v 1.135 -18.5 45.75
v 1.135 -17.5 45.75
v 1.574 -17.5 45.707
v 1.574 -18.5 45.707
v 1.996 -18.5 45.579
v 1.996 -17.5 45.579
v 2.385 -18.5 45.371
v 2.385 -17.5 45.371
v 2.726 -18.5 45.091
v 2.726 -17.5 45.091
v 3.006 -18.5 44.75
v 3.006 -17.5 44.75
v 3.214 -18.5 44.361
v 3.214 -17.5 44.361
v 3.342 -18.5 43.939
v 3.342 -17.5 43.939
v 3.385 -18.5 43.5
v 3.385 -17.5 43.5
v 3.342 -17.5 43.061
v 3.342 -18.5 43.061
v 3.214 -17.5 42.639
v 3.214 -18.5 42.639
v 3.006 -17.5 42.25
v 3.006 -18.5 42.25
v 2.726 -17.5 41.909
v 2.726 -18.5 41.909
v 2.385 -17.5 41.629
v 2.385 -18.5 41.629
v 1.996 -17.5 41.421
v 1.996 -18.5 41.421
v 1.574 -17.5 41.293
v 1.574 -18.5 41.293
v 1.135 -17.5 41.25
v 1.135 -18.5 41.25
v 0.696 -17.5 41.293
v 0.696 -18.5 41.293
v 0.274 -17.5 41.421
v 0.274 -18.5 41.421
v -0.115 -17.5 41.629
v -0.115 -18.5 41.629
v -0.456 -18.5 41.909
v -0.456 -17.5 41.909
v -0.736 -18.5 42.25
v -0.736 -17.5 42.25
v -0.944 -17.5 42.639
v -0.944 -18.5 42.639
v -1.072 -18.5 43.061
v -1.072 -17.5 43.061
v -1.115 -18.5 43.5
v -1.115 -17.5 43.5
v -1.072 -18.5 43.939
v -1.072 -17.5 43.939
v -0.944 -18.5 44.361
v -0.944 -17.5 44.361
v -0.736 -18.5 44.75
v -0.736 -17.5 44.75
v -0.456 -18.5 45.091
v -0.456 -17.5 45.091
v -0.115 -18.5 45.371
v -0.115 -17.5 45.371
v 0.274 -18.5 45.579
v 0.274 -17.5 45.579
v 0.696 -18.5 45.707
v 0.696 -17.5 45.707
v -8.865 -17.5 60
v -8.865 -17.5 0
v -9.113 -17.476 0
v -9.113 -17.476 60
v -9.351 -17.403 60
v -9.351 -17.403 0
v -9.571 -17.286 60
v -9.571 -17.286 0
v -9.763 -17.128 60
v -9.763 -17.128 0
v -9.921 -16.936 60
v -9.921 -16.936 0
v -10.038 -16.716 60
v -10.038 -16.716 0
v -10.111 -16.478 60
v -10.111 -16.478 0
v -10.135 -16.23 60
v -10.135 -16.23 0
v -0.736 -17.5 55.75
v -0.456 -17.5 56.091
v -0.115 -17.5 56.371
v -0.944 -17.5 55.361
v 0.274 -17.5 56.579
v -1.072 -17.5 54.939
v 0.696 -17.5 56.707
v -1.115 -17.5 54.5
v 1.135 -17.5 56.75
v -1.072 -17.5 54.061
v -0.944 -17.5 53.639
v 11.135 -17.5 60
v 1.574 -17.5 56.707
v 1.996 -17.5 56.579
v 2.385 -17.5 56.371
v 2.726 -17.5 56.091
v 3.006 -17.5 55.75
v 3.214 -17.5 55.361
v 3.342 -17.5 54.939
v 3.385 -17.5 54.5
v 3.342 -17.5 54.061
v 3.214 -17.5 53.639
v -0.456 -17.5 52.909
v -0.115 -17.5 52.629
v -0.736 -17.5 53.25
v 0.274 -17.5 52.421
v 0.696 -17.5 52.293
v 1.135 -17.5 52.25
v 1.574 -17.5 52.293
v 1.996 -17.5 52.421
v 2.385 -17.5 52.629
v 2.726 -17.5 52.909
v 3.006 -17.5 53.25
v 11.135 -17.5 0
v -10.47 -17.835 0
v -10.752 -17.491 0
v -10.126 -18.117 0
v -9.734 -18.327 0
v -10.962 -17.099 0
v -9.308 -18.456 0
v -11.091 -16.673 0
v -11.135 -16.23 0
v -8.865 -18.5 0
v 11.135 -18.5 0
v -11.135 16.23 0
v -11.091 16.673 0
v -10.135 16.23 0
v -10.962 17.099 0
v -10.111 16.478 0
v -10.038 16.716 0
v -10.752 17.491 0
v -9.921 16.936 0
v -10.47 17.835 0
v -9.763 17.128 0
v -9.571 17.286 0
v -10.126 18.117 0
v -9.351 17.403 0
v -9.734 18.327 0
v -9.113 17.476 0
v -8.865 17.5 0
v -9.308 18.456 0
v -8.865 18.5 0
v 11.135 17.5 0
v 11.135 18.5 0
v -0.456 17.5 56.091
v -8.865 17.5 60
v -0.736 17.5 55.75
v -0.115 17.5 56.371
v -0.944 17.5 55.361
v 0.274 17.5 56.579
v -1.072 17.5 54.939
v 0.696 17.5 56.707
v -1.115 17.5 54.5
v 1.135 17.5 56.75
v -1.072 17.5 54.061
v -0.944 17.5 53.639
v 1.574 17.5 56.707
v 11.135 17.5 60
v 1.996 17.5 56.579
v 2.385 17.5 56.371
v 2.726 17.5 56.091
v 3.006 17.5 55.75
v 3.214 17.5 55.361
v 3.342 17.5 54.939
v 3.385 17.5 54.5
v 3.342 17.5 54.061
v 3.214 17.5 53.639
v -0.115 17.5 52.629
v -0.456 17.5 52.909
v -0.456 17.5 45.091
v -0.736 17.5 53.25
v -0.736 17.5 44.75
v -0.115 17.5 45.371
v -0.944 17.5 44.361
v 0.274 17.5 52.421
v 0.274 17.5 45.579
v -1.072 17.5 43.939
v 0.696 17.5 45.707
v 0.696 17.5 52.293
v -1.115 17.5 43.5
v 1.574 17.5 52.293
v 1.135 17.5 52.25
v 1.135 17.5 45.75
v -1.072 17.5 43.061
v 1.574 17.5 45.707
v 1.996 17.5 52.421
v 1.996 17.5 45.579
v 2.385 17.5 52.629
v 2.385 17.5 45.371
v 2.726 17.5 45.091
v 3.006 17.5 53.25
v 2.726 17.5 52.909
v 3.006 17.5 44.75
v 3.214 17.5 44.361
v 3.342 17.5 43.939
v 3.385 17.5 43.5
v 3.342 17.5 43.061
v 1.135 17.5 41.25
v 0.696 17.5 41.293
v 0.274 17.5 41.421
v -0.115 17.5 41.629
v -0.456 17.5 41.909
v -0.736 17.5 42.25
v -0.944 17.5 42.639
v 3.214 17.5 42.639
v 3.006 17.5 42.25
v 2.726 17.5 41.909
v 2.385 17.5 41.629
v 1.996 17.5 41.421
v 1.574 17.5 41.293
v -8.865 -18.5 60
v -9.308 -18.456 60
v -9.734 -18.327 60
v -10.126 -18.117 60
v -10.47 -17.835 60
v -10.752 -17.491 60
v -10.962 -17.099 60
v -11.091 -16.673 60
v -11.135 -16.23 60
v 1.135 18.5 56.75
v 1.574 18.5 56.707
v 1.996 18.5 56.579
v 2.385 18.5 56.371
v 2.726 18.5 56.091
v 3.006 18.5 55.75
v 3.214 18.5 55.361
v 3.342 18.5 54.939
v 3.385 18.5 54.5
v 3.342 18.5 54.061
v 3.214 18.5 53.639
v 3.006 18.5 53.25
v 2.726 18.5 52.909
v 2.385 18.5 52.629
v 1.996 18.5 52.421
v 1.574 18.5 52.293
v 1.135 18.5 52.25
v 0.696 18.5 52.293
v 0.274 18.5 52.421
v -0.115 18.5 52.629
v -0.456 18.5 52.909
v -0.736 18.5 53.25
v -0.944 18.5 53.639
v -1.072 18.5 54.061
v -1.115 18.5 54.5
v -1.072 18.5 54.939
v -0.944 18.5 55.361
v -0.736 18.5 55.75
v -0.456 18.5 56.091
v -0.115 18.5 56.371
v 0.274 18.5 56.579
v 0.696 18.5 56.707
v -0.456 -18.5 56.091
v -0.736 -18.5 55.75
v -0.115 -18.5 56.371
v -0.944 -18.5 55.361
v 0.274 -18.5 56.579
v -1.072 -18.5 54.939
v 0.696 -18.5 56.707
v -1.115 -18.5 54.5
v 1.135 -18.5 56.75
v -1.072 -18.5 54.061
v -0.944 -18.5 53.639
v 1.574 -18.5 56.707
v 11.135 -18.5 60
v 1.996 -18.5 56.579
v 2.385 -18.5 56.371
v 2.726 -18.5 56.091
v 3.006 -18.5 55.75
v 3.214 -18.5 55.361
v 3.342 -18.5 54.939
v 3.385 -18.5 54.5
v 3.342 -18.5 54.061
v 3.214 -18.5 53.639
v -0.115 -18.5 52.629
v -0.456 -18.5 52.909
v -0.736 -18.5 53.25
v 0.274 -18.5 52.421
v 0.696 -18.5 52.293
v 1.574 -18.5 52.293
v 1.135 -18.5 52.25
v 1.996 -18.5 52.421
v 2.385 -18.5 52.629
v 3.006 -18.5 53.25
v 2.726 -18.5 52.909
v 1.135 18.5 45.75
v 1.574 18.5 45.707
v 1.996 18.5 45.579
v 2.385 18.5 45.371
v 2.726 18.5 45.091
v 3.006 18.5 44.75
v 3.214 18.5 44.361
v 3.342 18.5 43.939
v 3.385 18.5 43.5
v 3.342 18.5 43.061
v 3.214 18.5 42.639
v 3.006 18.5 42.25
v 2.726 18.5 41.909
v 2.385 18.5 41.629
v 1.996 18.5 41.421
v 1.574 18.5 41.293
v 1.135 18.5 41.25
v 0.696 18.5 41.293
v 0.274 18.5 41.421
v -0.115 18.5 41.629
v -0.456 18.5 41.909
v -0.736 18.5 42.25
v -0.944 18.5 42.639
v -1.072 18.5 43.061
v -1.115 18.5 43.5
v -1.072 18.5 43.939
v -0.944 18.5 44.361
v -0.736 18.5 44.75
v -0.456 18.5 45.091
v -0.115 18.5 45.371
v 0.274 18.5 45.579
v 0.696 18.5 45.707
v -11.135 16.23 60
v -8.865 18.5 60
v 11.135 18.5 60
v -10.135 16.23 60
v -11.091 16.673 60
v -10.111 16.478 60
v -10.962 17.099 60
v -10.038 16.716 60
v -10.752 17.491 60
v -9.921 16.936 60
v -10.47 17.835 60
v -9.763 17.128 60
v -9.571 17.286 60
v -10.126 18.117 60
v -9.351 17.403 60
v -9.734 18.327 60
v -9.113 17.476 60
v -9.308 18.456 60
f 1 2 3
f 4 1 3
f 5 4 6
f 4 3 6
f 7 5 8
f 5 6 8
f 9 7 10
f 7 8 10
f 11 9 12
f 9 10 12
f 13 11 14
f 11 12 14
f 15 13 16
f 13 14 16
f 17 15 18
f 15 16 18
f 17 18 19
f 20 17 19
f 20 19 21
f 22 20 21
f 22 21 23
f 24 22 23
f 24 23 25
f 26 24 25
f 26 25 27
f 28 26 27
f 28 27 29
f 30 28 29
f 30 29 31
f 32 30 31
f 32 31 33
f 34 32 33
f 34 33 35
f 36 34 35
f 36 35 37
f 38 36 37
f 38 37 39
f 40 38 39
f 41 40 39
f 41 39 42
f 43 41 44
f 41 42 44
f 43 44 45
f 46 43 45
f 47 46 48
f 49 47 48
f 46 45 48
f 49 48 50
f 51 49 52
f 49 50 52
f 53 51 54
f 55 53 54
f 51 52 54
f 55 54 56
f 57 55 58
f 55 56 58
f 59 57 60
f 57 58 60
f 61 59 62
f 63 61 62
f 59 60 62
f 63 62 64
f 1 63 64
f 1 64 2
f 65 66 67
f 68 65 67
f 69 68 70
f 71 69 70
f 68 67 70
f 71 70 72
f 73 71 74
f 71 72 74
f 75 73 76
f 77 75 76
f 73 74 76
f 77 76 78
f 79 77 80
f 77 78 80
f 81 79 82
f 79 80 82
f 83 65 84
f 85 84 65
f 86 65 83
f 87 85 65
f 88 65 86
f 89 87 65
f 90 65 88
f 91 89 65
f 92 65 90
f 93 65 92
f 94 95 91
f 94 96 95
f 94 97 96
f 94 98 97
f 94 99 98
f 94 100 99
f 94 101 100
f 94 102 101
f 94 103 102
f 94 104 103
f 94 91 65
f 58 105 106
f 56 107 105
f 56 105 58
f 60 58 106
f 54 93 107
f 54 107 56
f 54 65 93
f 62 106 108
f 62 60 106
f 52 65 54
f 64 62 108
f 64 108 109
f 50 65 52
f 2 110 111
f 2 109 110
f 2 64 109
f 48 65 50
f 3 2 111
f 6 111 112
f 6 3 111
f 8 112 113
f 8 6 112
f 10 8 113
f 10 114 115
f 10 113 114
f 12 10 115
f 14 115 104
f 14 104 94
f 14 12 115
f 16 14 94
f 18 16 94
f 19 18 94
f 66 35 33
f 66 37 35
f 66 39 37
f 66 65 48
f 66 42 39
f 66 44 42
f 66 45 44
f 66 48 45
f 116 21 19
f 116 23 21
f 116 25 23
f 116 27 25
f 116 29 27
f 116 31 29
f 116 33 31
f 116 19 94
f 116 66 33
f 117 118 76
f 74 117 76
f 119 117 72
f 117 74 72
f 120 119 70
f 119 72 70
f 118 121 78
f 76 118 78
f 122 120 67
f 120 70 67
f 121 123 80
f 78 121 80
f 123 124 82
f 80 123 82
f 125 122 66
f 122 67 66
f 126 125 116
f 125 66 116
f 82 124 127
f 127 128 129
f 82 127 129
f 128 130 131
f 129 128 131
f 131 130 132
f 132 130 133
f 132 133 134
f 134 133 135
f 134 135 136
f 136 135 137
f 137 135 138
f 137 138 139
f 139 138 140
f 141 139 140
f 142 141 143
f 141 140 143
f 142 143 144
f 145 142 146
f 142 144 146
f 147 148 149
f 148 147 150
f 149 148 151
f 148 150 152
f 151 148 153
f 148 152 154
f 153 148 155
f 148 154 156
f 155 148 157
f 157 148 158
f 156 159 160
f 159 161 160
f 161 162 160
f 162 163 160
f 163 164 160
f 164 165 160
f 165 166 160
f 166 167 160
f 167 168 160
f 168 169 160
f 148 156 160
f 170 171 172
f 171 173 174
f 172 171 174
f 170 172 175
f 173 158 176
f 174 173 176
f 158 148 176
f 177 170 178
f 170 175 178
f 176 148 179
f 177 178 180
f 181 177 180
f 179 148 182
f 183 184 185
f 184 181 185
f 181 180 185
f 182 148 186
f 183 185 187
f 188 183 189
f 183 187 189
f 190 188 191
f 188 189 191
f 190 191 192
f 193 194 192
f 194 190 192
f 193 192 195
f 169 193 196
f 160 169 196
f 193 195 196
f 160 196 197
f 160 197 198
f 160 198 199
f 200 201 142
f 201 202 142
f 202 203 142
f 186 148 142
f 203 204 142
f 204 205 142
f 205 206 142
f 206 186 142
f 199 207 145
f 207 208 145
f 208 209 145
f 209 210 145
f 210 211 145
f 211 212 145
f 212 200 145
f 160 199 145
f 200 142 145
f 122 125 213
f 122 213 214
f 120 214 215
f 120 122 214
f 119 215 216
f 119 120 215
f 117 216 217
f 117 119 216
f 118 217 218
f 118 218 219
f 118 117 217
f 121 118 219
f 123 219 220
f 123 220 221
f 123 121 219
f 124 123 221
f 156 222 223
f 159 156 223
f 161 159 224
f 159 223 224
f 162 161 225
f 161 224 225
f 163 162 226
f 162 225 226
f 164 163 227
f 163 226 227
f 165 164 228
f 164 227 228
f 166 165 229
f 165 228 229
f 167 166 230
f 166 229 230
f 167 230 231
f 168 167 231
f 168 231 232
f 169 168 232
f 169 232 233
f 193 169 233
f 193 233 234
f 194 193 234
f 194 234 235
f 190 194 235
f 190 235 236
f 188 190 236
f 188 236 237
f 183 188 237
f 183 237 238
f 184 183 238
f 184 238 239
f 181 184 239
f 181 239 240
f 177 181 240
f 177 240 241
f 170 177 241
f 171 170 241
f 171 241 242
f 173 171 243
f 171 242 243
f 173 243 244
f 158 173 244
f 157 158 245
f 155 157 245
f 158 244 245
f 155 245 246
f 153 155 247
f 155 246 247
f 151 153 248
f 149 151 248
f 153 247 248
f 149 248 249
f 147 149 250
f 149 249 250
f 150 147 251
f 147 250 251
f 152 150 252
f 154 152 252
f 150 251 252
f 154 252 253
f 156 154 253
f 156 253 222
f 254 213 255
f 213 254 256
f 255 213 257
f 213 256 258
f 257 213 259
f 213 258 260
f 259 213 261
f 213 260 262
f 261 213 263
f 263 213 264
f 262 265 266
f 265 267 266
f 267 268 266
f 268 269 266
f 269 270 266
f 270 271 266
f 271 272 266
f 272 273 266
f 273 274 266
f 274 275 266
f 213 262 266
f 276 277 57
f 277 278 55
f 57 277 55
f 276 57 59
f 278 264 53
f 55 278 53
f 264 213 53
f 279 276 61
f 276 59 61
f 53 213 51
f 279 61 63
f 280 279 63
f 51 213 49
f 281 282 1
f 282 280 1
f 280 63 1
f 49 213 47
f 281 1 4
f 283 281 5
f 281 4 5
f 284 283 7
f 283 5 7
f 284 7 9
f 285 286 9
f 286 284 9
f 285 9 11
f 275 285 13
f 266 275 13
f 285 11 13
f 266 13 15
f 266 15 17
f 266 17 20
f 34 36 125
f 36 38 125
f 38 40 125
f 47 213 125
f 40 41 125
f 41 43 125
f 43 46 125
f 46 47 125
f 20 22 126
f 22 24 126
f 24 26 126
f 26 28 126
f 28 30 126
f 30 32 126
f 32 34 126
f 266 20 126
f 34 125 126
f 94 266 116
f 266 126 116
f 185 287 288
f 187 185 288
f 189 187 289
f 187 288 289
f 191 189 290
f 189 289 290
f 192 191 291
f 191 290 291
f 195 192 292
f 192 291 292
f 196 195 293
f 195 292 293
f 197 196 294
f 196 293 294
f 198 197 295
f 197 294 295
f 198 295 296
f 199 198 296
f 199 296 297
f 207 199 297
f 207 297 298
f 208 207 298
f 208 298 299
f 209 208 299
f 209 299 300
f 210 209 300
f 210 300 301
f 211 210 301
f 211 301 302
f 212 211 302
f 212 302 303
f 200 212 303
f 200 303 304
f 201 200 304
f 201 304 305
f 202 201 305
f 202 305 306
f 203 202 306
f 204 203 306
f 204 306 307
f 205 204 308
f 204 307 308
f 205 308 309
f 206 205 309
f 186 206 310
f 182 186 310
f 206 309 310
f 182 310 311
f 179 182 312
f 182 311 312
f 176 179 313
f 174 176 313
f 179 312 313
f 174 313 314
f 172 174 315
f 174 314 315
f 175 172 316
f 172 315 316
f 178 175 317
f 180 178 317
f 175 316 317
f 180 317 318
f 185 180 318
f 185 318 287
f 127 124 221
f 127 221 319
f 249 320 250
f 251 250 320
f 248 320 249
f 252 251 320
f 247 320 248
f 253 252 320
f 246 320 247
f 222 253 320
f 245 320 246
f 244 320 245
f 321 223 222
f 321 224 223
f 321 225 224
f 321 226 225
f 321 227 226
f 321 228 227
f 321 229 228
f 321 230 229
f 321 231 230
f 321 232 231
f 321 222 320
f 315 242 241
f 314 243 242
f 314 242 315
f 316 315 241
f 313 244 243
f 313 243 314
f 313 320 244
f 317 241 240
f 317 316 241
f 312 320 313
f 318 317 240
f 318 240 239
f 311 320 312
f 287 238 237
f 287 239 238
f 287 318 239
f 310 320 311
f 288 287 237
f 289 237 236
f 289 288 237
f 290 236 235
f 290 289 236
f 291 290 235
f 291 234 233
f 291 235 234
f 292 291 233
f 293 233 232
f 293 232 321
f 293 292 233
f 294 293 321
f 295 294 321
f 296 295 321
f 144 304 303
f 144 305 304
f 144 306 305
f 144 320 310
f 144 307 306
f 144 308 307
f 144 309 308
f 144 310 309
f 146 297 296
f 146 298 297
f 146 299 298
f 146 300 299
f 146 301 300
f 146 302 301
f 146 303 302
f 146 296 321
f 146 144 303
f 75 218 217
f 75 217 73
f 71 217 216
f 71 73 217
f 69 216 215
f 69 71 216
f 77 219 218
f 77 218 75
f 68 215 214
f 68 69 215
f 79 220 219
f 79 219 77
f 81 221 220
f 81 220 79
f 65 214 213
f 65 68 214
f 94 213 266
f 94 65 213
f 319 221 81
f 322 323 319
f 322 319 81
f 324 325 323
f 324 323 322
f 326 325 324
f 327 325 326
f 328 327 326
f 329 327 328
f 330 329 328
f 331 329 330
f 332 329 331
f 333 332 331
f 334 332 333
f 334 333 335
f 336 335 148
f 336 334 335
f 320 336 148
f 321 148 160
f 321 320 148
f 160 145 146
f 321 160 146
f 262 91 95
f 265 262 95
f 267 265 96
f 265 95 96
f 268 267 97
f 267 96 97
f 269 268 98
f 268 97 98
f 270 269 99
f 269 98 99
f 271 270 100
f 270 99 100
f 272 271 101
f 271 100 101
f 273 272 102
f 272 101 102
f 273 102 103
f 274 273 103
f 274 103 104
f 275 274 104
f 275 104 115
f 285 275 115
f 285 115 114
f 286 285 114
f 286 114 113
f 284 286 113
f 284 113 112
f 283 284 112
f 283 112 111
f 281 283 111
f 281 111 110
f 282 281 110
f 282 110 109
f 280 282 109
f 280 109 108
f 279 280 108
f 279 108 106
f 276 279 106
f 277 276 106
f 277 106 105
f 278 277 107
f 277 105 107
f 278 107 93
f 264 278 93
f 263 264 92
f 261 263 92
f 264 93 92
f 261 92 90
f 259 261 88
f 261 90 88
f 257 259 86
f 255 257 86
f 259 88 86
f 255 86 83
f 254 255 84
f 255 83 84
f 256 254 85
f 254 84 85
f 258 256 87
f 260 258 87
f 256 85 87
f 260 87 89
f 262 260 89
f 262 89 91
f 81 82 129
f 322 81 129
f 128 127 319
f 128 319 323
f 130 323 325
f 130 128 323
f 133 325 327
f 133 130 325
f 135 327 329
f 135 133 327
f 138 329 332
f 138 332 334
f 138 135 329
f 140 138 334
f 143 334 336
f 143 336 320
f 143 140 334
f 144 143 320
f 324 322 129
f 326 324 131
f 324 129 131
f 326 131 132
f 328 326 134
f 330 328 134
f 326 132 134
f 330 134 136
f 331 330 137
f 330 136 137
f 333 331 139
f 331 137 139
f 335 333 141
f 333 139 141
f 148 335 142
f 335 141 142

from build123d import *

# Parameters (mm, degrees)
SKETCH1_W              = 22.27
SKETCH1_H              = 37
BOSS_EXTRUDE1_DEPTH    = 60
SHELL1_T               = -1
CONVERT_SOLID1_DEPTH   = 60
CONVERT_SOLID1_2_DEPTH = 60
SKETCH6_R              = 2.25
CUT_EXTRUDE1_DEPTH     = 72.365175156


# Read off the part's stored shape, not the designer's step: Convert-Solid1
with BuildPart() as part:
    # Sketch1 → Boss-Extrude1 (new body)
    with BuildSketch(Plane.XY):
        Rectangle(SKETCH1_W, SKETCH1_H)
    extrude(amount=BOSS_EXTRUDE1_DEPTH)

    # Shell1
    shell1_openings = [part.faces().sort_by_distance(p)[0] for p in [
        (0, 0, 60),
        (0, 0, 0),
        (11.135, 0, 30),
    ]]
    offset(amount=SHELL1_T, openings=shell1_openings, kind=Kind.INTERSECTION)

    # Convert-Solid1 outline → Convert-Solid1 (cut)
    with BuildSketch(Plane.XY):
        with BuildLine():
            Line((-11.135, 18.5), (-11.135, 16.23))
            ThreePointArc((-11.135, 16.23), (-10.470132393, 17.835132393), (-8.865, 18.5))
            Line((-8.865, 18.5), (-11.135, 18.5))
        make_face()
        with BuildLine():
            ThreePointArc((-8.865, -18.5), (-10.470132393, -17.835132393), (-11.135, -16.23))
            Line((-11.135, -16.23), (-11.135, -18.5))
            Line((-11.135, -18.5), (-8.865, -18.5))
        make_face()
    extrude(amount=CONVERT_SOLID1_DEPTH, mode=Mode.SUBTRACT)

    # Convert-Solid1 2 outline → Convert-Solid1 2 (add)
    with BuildSketch(Plane.XY):
        with BuildLine():
            Line((-10.135, 17.5), (-10.135, 16.23))
            ThreePointArc((-10.135, 16.23), (-9.763025612, 17.128025612), (-8.865, 17.5))
            Line((-8.865, 17.5), (-10.135, 17.5))
        make_face()
        with BuildLine():
            ThreePointArc((-8.865, -17.5), (-9.763025612, -17.128025612), (-10.135, -16.23))
            Line((-10.135, -16.23), (-10.135, -17.5))
            Line((-10.135, -17.5), (-8.865, -17.5))
        make_face()
    extrude(amount=CONVERT_SOLID1_2_DEPTH)

    # Sketch6 → Cut-Extrude1 (cut, through all)
    with BuildSketch(Plane(origin=(0, 18.5, 0), x_dir=(1, 0, 0), z_dir=(0, 1, 0))):
        with Locations(Location((1.135, -43.5, 0), (0, 0, 270))):
            Circle(SKETCH6_R)
        with Locations(Location((1.135, -54.5, 0), (0, 0, 270))):
            Circle(SKETCH6_R)
    extrude(amount=-CUT_EXTRUDE1_DEPTH, mode=Mode.SUBTRACT)


solid = part.part
